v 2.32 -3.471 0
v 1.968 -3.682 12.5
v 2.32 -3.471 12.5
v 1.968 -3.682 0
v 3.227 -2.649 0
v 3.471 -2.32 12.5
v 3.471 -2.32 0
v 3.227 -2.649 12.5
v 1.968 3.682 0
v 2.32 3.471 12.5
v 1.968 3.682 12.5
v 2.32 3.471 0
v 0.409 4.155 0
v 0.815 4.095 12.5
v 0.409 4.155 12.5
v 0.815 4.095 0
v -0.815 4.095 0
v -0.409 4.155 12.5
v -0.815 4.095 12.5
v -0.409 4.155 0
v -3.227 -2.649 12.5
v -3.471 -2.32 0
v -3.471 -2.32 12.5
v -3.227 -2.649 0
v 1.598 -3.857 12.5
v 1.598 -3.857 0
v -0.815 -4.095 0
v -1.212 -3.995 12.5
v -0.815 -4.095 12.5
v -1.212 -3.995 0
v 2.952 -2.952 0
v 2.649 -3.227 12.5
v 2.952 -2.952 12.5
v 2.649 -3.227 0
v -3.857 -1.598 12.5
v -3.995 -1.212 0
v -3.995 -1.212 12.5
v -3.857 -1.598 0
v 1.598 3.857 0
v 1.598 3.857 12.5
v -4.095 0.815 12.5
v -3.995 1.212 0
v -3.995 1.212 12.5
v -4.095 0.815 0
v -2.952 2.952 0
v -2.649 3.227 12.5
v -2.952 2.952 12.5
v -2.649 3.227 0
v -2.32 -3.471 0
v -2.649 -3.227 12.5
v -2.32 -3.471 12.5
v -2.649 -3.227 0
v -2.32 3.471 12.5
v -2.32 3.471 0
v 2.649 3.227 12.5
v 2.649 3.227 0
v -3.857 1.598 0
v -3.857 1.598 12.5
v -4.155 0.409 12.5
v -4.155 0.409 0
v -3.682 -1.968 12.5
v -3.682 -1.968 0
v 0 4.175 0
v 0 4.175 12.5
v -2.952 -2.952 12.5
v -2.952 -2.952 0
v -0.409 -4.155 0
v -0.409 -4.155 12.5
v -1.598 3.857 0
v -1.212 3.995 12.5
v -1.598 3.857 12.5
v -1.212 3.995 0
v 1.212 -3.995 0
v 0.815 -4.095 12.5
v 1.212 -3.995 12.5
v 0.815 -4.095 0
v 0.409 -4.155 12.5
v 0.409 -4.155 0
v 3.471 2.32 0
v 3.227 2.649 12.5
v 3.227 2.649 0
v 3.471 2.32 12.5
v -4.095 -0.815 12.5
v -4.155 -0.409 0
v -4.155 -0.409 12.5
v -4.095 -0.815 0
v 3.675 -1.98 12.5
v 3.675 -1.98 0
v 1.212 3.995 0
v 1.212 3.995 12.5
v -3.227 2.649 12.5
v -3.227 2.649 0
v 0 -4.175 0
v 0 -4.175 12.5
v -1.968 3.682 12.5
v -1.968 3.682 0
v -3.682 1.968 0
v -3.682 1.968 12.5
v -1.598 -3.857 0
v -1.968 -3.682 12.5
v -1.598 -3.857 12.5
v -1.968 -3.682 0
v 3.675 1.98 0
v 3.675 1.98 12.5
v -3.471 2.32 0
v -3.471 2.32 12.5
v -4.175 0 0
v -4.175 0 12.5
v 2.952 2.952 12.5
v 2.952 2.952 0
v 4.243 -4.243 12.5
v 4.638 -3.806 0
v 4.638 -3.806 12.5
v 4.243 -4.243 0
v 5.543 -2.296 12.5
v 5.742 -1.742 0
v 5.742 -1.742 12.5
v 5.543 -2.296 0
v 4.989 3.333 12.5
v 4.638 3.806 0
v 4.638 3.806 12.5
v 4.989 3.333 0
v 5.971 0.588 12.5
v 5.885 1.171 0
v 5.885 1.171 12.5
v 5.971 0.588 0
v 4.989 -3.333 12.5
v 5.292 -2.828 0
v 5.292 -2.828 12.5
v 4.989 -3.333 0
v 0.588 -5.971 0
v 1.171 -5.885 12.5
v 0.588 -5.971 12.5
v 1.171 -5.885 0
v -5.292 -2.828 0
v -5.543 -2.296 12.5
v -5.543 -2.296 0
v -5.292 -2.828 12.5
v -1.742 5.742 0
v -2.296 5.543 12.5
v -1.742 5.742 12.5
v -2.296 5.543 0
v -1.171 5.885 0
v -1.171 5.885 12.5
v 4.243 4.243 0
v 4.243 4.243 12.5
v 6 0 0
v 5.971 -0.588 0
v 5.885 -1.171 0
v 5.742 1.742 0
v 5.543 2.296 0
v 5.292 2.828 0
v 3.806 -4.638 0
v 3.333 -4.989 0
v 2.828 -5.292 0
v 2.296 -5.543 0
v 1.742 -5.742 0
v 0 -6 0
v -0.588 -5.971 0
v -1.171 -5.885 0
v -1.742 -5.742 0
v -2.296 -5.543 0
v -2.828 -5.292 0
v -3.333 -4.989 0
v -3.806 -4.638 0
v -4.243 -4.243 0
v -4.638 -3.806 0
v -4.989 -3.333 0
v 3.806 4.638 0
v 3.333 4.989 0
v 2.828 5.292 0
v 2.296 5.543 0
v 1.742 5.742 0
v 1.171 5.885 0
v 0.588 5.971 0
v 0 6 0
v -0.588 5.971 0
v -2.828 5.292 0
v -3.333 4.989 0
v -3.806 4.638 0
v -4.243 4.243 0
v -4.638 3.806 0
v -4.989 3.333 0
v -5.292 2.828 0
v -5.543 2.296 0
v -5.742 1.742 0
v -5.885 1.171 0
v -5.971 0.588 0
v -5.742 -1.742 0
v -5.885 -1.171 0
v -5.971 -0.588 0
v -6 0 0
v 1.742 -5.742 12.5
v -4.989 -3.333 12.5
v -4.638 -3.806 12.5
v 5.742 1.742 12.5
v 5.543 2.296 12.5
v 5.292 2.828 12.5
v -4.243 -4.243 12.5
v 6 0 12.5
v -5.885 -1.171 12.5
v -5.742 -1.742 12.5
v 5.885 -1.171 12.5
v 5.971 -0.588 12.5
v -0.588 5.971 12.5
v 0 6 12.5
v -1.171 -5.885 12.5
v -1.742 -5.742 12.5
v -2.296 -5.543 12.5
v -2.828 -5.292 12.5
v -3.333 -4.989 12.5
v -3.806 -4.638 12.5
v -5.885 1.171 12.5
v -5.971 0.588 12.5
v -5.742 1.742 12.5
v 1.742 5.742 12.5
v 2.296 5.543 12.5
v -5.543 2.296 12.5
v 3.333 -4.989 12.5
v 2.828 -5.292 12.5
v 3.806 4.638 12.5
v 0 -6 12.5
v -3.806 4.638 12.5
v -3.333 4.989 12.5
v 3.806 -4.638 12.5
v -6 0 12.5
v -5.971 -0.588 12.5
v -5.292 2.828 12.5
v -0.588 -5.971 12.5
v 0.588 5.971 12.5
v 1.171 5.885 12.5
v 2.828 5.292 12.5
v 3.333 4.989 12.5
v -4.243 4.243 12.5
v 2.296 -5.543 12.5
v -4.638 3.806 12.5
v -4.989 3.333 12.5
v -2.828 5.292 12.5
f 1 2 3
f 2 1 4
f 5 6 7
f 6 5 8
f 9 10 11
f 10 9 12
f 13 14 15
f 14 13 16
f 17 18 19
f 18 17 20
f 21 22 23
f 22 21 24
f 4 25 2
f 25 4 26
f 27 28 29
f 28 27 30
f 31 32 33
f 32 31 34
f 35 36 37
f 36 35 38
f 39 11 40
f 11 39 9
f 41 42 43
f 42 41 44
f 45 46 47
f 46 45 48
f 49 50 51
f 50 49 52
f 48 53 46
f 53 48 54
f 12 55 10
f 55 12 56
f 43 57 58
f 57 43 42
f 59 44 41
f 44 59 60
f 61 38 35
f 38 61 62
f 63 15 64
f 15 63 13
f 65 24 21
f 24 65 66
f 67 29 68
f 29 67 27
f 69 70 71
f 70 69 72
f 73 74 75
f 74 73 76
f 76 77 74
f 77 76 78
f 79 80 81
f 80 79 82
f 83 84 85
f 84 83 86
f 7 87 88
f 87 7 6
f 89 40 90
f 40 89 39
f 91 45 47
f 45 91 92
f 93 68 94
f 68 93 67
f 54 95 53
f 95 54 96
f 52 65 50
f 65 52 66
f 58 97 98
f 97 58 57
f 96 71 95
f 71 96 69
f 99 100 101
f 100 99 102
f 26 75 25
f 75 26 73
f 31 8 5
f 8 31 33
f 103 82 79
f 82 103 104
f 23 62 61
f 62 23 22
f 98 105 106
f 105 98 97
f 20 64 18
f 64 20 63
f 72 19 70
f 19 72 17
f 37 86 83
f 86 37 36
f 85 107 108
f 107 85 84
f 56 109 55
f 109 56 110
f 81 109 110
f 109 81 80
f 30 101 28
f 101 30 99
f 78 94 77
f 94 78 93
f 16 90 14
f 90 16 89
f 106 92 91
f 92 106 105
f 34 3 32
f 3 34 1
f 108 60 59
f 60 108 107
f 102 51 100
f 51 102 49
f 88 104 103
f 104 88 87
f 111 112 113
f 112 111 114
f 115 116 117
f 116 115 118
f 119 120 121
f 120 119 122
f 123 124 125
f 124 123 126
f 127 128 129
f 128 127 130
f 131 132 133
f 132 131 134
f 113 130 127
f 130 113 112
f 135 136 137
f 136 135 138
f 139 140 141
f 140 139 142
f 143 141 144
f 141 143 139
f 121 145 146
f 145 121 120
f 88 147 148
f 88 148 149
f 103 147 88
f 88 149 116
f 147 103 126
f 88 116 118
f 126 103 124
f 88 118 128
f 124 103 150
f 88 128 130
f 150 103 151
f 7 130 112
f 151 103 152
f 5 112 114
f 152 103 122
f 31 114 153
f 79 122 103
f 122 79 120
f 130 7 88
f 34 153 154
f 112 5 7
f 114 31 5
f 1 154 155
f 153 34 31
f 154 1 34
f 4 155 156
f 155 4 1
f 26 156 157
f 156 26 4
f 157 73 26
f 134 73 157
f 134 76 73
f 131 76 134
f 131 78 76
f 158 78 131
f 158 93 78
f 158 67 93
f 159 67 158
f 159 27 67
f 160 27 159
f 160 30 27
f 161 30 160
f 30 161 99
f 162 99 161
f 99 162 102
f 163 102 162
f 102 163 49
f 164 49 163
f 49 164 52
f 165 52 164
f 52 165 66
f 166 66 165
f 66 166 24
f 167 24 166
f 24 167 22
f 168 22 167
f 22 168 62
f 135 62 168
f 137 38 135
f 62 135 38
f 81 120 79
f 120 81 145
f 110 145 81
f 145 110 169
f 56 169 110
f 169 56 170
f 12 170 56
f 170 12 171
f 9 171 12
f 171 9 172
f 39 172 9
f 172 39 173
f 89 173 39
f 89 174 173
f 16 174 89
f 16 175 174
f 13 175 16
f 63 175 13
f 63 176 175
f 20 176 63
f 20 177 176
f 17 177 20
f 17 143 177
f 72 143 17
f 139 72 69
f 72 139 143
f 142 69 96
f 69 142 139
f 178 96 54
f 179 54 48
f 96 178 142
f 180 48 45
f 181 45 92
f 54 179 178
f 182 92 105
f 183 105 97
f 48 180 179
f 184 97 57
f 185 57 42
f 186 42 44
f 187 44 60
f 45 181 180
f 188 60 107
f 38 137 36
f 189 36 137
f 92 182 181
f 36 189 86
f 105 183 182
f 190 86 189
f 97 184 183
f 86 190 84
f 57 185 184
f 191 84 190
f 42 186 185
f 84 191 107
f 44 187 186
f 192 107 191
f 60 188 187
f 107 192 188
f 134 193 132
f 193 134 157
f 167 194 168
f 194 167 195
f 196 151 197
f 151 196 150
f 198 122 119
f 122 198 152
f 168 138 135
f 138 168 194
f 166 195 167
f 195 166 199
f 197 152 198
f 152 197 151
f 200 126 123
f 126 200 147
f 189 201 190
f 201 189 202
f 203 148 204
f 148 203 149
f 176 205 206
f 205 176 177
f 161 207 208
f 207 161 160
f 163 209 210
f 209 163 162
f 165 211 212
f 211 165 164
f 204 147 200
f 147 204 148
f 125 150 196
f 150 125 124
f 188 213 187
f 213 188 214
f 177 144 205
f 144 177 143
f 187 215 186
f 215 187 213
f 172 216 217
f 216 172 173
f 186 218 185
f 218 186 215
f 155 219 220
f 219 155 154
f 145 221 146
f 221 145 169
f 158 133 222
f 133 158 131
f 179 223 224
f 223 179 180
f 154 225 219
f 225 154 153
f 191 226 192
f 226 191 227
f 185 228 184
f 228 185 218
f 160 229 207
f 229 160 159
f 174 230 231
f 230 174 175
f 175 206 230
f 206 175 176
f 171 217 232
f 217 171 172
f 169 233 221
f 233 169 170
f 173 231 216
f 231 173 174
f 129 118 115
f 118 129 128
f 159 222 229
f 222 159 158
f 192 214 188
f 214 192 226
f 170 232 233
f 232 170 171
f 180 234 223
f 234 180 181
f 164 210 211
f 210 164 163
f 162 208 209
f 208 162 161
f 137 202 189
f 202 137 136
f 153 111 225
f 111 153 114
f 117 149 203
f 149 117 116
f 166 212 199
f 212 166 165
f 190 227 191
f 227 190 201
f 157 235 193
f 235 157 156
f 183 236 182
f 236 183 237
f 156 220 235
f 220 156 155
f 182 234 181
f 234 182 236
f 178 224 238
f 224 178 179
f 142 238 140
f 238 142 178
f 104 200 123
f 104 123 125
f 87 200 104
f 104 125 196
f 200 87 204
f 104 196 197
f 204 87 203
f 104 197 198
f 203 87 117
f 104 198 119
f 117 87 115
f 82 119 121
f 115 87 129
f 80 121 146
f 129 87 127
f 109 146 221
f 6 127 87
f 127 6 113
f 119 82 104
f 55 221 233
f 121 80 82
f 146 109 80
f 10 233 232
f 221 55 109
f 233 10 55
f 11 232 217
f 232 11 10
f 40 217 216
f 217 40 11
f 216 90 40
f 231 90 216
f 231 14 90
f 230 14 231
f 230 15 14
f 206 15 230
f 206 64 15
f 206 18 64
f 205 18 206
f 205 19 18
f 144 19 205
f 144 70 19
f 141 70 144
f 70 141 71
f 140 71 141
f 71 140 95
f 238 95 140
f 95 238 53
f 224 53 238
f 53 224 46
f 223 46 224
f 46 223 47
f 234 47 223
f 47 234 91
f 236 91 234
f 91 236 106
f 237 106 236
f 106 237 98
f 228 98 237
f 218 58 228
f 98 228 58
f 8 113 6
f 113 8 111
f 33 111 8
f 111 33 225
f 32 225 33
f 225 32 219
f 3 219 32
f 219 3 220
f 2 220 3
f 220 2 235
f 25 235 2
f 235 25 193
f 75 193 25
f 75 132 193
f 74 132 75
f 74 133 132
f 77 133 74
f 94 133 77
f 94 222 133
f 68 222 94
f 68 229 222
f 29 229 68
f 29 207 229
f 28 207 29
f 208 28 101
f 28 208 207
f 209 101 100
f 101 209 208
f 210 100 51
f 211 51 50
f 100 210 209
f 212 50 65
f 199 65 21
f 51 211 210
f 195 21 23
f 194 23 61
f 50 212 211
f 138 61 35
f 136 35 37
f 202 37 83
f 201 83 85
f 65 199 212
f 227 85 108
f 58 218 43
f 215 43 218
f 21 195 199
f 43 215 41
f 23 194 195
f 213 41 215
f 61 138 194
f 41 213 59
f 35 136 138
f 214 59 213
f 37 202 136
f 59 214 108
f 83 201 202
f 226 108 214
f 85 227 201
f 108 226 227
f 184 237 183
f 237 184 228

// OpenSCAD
// file: parameters.scad
// =============================================================================
// Gen-BF — nightly 2026-10-04 (physics_scorer, honest magpylib watts)
// 8-pole / 6-coil dual rotor with big 51.5 deg sector coils and TALL 9.9 mm copper, magnets seated directly on 3 mm steel back-iron discs (through-pockets) so the field stays high across a wide gap.
// Clocking 0 deg (magnets N facing S) + D-flat keyed bore + index notch + flip-symmetric hole map.
// Windable 2-piece bobbin; turns = physics_scorer turns_fit; copper only between flanges.
// Steel back-iron: two 3.0 mm mild-steel discs (steel_backiron_disc.dxf); magnets sit ON the steel
// (through-pockets) -> score with --back-iron.
// =============================================================================
topology            = "dual_rotor";

// --- Wire / winding (physics_scorer winding-fit) -------------------------------
wire_awg            = 26;
wire_od             = 0.45;     // insulated OD mm (bare 0.405)
fill_realistic      = 0.60;     // insulated-wire area / window, hand-wound layered
turns               = 571;       // = physics_scorer turns_fit (do NOT raise)
coil_former_type    = "bobbin";
coil_core_inset     = 15.30;     // radial copper build: hub = copper boundary inset by this
wind_build_axial    = 0.0;      // nothing proud of the flanges
wind_build_radial   = 0.0;

// --- Bobbin (base + lid) ---------------------------------------------------------
coil_id_r           = 25.00;    // copper boundary sector
coil_od_r           = 62.00;
span_deg            = 51.51;    // = pitch - 2*asin((wall+0.85)/coil_id_r) -> >=1.2 mm stator web
former_web          = 9.90;     // copper height between flanges (TALL copper: steel keeps Bz up)
flange_t            = 0.80;     // >= 0.8 mm FDM wall rule (tall winds push on the flanges)
wall                = 1.00;     // flange lip beyond copper
former_bare_h       = former_web + 2 * flange_t;
coil_envelope_h     = former_bare_h + 2 * wind_build_axial;
tab_w               = 7.0;
tab_len             = 7.0;
tab_h               = former_bare_h / 2;
pin_d               = 1.9;      // 1.75 mm filament locating pin
coil_mount_r        = coil_od_r + 0.2 + 4.0;
lead_y              = 1.6;
lead_slot_w         = 0.9;
lead_groove_d       = 0.6;

// --- Gap -------------------------------------------------------------------------
run_clear           = 0.50;     // rotor face -> flange
gap_spacer_h        = run_clear + wind_build_axial;
m2m                 = coil_envelope_h + 2 * run_clear;   // rotor face to rotor face (= gap_sleeve length)

// --- Stator ----------------------------------------------------------------------
coil_stations       = 6;
bay_clear           = 0.25;
stator_thick        = former_bare_h;                        // bobbins flush both faces
stator_od           = 149.0;
shaft_clear_stator  = 14.0;     // stator is static; gap sleeve OD 12 spins inside

// --- Rotor(s) --------------------------------------------------------------------
magnet_Br           = 1.43;     // N52
magnet_d_large      = 20.0;
magnet_h_large      = 5.0;      // one O20x5 per pocket
magnet_h_small      = 5.0;      // one O5x5 per pocket
halbach_magnetisation = "diametric"; // O5x5 assist magnets MUST be DIAMETRICALLY magnetised (tangential)
rotor_b_same_axis   = true;     // same-index magnets share one axis: N faces S across the gap
large_pocket_d      = 20.3;
small_pocket_d      = 5.3;
pocket_h            = 5.10;     // THROUGH the carrier: magnet back face sits on the steel disc
large_n             = 8;
R_large             = 44.0;
R_small_inner       = 30.0;
R_small_mid         = 44.0;
R_small_outer       = 59.0;
small_r_list        = [R_small_inner, R_small_mid, R_small_outer];   // O5 pockets between poles
carrier_od          = 127.0;
carrier_thick       = pocket_h;
hub_h               = 10.0;
hub_od              = 24.0;     // slim hub so the M4 brace rods fit at R~18 inside the coil ring
hub_insert_d        = 4.0;      // M3 heat-set insert, radial, bears on the D-flat
rotor_b_offset_deg  = 0.0;      // CLOCKING: magnets directly opposite
shaft_key           = "dflat";
dflat_depth         = 0.5;      // 8 mm shaft with 0.5 mm flat (7.5 across flat)
index_notch_d       = 3.0;

// --- Steel back-iron (buyable laser-cut) -------------------------------------------
steel_t             = 3.0;      // mild steel thickness (not modelled by the image method; >=3 avoids saturation)
steel_center_hole   = 26.0;     // slips over the rotor hub (OD 24)

// --- Modular MAX interface ----------------------------------------------------------
shaft_bore          = 8.35;
dflat_x             = 4.0 - dflat_depth + (shaft_bore - 8.0) / 2;
bearing_d           = 21.85;
bearing_h           = 7.2;
m3_clear            = 3.5;
bolt_r_inner        = 27.0;     // M3 steel-disc clamp bolts (inside the magnet ring)
bolt_n_inner        = 4;
bolt_inner_angles   = [0, 90, 180, 270];
bolt_r_outer        = 57.0;     // M3 steel-disc clamp bolts (outside the magnet ring)
bolt_outer_angles   = [0, 90, 180, 270];
flange_bolt_r       = 69.5;     // frame rods: OUTSIDE the rotor OD (rotors spin inside them)
flange_bolt_n       = 6;
flange_bolt_offset  = 30.00;    // between coil stations -> never cuts a lead groove/tab
brace_r             = 18.0;
brace_d             = 4.3;      // temporary M4 jack rods (assembly only)
brace_n             = 4;
brace_angles        = [45, 135, 225, 315];          // flip-symmetric

spacer_pad_od       = 14.0;
spacer_pad_id       = m3_clear;
endbell_od          = 149.0;
endbell_thick       = 8.0;
endbell_shaft_clear = 10.0;
collar_h            = 10.0;
standoff_od         = 9.0;
frame_standoff_h    = run_clear + carrier_thick + hub_h + collar_h + 2.0;
sleeve_od           = 12.0;
plate_max_mm        = 410;

$fn = 64;
// main file
// Gen-BF — gap sleeve: rigid spacer on the shaft BETWEEN the two rotor carriers (passes through the stator
// hole). Length = m2m, so it sets the magnet gap and carries the full magnet pull. Print x1, upright.
include <parameters.scad>;
$fn = 64;
// D-flat keyed bore: flat faces +X (angle 0 = magnet pocket 0 = index notch)
module dflat_bore(h) {
    intersection() {
        cylinder(d=shaft_bore, h=h);
        translate([-shaft_bore, -shaft_bore, 0]) cube([shaft_bore + dflat_x, 2*shaft_bore, h]);
    }
}

difference() {
    cylinder(d=sleeve_od, h=m2m);
    translate([0, 0, -0.1]) dflat_bore(m2m + 0.2);
}
